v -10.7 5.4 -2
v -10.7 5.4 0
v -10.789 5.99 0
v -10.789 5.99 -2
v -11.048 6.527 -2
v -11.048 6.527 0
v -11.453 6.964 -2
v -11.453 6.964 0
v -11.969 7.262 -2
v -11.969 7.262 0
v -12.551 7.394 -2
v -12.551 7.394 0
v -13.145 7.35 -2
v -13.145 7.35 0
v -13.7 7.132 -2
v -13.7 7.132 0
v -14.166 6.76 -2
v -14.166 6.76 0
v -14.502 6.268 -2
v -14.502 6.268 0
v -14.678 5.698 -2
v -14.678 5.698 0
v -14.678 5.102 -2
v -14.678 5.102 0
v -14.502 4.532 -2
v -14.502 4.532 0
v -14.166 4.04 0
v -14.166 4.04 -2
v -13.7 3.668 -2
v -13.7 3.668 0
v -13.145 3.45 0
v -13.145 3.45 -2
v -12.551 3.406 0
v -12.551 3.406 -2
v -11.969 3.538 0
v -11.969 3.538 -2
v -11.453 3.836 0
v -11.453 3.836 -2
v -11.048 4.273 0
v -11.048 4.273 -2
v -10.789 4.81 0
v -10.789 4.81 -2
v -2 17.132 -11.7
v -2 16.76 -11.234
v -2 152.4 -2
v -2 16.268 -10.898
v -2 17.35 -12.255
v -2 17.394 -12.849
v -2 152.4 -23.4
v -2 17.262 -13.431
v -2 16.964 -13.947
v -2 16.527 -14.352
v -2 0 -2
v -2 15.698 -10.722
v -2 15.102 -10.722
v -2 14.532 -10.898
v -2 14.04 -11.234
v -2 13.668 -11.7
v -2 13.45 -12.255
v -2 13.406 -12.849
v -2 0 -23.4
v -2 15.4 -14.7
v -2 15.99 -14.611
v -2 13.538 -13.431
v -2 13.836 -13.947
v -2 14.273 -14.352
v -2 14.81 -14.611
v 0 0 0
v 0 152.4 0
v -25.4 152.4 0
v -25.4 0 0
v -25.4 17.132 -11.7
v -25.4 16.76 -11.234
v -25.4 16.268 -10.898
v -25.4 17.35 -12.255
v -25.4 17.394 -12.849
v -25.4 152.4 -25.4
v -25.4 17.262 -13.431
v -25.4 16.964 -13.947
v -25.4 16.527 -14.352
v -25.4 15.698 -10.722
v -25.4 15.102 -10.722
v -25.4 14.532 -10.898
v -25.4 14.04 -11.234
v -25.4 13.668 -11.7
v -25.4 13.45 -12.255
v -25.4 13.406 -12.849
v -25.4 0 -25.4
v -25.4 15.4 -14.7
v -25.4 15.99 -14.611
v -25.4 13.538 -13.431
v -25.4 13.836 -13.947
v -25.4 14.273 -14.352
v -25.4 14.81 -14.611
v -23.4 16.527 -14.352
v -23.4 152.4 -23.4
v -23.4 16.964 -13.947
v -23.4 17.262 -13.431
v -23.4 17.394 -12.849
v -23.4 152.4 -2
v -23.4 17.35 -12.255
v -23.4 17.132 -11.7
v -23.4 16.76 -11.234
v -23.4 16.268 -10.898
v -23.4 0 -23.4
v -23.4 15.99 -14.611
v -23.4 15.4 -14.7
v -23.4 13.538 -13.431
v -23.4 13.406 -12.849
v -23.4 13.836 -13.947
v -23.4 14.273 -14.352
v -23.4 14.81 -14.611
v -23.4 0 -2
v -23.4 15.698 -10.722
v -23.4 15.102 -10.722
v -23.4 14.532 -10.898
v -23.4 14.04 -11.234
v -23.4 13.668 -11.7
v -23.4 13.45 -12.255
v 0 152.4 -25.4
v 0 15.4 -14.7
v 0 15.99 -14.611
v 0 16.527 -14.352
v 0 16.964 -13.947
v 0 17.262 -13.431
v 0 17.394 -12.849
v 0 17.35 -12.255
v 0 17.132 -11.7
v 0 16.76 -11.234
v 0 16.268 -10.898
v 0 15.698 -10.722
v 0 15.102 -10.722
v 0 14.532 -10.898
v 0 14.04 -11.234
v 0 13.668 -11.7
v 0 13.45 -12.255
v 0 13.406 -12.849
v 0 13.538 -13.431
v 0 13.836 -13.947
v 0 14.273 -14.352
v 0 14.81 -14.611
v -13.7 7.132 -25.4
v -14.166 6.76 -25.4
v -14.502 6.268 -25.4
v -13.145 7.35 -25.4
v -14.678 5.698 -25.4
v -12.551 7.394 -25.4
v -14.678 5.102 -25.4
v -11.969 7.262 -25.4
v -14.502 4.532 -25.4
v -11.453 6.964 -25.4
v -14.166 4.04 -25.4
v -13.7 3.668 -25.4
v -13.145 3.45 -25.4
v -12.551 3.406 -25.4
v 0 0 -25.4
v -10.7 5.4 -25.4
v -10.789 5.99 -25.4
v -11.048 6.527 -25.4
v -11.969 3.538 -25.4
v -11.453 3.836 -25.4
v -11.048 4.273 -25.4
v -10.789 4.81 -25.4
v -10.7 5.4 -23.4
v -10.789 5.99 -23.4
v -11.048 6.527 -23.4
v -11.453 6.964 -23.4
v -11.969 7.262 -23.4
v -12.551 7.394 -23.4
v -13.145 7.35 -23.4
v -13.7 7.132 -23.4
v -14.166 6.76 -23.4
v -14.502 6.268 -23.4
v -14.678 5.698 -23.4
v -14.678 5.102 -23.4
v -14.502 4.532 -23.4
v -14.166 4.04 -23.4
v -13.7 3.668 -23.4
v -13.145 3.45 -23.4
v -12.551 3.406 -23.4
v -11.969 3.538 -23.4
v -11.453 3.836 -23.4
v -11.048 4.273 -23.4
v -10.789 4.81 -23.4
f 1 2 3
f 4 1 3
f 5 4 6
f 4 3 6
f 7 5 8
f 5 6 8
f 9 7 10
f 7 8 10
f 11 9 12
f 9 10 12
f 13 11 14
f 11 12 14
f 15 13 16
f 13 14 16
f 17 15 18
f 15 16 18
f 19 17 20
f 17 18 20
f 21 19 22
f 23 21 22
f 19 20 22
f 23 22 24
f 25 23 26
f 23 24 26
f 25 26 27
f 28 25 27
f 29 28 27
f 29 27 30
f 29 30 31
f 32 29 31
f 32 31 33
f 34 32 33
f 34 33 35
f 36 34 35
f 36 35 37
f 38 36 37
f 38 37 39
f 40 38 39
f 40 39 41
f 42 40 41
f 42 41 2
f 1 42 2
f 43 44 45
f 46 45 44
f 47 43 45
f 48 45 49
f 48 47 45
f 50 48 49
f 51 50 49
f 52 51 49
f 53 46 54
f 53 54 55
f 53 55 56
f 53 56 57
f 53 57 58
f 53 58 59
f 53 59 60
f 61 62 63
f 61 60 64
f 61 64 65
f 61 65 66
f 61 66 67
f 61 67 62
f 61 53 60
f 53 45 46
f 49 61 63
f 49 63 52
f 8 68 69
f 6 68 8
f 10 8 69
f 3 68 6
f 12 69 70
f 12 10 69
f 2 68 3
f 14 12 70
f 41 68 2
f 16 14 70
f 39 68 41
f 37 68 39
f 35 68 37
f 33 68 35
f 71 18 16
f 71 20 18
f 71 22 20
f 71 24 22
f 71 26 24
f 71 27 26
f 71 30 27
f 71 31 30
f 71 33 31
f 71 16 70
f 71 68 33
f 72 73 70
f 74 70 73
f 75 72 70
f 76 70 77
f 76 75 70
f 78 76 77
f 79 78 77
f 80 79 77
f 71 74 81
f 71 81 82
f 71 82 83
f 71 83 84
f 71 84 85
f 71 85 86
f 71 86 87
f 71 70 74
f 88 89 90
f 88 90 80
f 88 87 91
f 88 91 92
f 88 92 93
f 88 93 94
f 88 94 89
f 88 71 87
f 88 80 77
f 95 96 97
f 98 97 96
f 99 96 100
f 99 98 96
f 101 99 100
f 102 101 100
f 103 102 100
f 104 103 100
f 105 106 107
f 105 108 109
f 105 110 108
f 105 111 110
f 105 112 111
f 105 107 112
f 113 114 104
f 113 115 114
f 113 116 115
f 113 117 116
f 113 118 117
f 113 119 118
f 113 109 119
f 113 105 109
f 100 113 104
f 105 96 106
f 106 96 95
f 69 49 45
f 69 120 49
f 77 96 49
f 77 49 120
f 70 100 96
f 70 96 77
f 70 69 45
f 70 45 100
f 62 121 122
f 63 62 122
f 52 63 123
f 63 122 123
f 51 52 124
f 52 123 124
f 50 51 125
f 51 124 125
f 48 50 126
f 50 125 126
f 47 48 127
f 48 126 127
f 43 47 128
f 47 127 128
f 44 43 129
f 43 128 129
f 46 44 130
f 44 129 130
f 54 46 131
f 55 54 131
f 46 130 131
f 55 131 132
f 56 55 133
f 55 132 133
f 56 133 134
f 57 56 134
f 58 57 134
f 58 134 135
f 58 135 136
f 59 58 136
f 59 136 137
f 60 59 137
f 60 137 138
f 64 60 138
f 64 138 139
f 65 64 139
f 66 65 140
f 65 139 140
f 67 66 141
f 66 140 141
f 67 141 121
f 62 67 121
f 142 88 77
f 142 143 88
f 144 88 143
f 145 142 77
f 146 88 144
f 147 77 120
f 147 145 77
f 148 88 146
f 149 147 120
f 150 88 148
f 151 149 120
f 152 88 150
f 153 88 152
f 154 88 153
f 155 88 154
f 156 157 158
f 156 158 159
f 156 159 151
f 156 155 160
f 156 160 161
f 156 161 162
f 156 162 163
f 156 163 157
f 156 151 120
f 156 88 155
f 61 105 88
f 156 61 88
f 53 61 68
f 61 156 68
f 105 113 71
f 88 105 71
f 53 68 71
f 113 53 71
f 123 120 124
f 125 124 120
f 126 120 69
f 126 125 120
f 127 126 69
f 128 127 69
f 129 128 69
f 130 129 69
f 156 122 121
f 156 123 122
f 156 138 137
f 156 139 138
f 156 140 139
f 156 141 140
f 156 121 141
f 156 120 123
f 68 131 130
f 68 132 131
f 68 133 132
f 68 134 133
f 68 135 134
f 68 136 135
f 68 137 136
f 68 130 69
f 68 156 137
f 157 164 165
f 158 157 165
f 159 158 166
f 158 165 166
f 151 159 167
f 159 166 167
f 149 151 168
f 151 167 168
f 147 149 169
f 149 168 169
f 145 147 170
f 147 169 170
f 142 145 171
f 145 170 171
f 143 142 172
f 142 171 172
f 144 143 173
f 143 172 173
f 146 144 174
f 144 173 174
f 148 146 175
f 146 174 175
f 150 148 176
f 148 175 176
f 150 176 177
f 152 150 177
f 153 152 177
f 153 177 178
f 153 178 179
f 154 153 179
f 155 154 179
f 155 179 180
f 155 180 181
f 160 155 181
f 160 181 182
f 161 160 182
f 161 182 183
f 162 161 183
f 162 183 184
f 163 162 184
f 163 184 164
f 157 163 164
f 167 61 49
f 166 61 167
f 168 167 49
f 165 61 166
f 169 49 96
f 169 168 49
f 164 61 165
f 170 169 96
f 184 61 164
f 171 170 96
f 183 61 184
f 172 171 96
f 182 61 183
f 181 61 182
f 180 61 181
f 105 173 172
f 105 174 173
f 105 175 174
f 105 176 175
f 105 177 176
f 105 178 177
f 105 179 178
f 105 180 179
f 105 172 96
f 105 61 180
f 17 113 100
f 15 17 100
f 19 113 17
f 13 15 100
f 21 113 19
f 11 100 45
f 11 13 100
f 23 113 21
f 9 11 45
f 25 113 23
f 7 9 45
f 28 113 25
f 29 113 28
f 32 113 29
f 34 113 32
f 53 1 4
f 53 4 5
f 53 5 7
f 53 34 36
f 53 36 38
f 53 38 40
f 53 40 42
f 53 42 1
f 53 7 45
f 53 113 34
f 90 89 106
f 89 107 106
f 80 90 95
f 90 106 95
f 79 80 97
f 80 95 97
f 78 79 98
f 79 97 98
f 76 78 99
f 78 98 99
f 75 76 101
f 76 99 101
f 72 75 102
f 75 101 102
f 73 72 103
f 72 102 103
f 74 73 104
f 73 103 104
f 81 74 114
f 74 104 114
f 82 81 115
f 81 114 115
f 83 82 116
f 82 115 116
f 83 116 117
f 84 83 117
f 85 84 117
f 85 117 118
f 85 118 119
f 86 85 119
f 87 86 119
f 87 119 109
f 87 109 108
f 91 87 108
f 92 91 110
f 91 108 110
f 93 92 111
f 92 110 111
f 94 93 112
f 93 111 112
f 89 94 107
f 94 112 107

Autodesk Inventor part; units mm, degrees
ref_plane "YZ Plane" through (0, 0, 0) normal (1, 0, 0) x (0, 1, 0)
ref_plane "XZ Plane" through (0, 0, 0) normal (0, 1, 0) x (-1, 0, 0)
ref_plane "XY Plane" through (0, 0, 0) normal (0, 0, 1) x (1, 0, 0)
sketch "Sketch1" plane through (0, 0, 0) normal (0, 1, 0) x (-1, 0, 0)
  line L0 (0, 0) -> (25.4, 0)
  line L1 (25.4, 0) -> (25.4, -25.4)
  line L2 (25.4, -25.4) -> (0, -25.4)
  line L3 (0, -25.4) -> (0, 0)
  line L4 (23.4, -23.4) -> (23.4, -2)
  line L5 (23.4, -2) -> (2, -2)
  line L6 (2, -2) -> (2, -23.4)
  line L7 (2, -23.4) -> (23.4, -23.4)
  dimension "d0" = 25.4
  dimension "d1" = 25.4
  dimension "d2" = 2
extrude "Extrusion1" add sketch "Sketch1" along normal blind 152.4
sketch "Sketch2" plane through (-25.4, 0, 0) normal (0, 0, 1) x (1, 0, 0)
  line L0 (25.4, 0) -> (0, 0) projected
  circle A0 centre (12.7, 5.4) radius 2
  dimension "d6" = 4
extrude "Extrusion2" cut sketch "Sketch2" against normal through all
sketch "Sketch3" plane through (0, 0, 0) normal (1, 0, 0) x (0, 0, -1)
  line L0 (0, 0) -> (25.4, 0) projected
  circle A0 centre (12.7, 15.4) radius 2
  dimension "d10" = 4
extrude "Extrusion3" cut sketch "Sketch3" against normal through all
properties part number "Metal_Bone"
